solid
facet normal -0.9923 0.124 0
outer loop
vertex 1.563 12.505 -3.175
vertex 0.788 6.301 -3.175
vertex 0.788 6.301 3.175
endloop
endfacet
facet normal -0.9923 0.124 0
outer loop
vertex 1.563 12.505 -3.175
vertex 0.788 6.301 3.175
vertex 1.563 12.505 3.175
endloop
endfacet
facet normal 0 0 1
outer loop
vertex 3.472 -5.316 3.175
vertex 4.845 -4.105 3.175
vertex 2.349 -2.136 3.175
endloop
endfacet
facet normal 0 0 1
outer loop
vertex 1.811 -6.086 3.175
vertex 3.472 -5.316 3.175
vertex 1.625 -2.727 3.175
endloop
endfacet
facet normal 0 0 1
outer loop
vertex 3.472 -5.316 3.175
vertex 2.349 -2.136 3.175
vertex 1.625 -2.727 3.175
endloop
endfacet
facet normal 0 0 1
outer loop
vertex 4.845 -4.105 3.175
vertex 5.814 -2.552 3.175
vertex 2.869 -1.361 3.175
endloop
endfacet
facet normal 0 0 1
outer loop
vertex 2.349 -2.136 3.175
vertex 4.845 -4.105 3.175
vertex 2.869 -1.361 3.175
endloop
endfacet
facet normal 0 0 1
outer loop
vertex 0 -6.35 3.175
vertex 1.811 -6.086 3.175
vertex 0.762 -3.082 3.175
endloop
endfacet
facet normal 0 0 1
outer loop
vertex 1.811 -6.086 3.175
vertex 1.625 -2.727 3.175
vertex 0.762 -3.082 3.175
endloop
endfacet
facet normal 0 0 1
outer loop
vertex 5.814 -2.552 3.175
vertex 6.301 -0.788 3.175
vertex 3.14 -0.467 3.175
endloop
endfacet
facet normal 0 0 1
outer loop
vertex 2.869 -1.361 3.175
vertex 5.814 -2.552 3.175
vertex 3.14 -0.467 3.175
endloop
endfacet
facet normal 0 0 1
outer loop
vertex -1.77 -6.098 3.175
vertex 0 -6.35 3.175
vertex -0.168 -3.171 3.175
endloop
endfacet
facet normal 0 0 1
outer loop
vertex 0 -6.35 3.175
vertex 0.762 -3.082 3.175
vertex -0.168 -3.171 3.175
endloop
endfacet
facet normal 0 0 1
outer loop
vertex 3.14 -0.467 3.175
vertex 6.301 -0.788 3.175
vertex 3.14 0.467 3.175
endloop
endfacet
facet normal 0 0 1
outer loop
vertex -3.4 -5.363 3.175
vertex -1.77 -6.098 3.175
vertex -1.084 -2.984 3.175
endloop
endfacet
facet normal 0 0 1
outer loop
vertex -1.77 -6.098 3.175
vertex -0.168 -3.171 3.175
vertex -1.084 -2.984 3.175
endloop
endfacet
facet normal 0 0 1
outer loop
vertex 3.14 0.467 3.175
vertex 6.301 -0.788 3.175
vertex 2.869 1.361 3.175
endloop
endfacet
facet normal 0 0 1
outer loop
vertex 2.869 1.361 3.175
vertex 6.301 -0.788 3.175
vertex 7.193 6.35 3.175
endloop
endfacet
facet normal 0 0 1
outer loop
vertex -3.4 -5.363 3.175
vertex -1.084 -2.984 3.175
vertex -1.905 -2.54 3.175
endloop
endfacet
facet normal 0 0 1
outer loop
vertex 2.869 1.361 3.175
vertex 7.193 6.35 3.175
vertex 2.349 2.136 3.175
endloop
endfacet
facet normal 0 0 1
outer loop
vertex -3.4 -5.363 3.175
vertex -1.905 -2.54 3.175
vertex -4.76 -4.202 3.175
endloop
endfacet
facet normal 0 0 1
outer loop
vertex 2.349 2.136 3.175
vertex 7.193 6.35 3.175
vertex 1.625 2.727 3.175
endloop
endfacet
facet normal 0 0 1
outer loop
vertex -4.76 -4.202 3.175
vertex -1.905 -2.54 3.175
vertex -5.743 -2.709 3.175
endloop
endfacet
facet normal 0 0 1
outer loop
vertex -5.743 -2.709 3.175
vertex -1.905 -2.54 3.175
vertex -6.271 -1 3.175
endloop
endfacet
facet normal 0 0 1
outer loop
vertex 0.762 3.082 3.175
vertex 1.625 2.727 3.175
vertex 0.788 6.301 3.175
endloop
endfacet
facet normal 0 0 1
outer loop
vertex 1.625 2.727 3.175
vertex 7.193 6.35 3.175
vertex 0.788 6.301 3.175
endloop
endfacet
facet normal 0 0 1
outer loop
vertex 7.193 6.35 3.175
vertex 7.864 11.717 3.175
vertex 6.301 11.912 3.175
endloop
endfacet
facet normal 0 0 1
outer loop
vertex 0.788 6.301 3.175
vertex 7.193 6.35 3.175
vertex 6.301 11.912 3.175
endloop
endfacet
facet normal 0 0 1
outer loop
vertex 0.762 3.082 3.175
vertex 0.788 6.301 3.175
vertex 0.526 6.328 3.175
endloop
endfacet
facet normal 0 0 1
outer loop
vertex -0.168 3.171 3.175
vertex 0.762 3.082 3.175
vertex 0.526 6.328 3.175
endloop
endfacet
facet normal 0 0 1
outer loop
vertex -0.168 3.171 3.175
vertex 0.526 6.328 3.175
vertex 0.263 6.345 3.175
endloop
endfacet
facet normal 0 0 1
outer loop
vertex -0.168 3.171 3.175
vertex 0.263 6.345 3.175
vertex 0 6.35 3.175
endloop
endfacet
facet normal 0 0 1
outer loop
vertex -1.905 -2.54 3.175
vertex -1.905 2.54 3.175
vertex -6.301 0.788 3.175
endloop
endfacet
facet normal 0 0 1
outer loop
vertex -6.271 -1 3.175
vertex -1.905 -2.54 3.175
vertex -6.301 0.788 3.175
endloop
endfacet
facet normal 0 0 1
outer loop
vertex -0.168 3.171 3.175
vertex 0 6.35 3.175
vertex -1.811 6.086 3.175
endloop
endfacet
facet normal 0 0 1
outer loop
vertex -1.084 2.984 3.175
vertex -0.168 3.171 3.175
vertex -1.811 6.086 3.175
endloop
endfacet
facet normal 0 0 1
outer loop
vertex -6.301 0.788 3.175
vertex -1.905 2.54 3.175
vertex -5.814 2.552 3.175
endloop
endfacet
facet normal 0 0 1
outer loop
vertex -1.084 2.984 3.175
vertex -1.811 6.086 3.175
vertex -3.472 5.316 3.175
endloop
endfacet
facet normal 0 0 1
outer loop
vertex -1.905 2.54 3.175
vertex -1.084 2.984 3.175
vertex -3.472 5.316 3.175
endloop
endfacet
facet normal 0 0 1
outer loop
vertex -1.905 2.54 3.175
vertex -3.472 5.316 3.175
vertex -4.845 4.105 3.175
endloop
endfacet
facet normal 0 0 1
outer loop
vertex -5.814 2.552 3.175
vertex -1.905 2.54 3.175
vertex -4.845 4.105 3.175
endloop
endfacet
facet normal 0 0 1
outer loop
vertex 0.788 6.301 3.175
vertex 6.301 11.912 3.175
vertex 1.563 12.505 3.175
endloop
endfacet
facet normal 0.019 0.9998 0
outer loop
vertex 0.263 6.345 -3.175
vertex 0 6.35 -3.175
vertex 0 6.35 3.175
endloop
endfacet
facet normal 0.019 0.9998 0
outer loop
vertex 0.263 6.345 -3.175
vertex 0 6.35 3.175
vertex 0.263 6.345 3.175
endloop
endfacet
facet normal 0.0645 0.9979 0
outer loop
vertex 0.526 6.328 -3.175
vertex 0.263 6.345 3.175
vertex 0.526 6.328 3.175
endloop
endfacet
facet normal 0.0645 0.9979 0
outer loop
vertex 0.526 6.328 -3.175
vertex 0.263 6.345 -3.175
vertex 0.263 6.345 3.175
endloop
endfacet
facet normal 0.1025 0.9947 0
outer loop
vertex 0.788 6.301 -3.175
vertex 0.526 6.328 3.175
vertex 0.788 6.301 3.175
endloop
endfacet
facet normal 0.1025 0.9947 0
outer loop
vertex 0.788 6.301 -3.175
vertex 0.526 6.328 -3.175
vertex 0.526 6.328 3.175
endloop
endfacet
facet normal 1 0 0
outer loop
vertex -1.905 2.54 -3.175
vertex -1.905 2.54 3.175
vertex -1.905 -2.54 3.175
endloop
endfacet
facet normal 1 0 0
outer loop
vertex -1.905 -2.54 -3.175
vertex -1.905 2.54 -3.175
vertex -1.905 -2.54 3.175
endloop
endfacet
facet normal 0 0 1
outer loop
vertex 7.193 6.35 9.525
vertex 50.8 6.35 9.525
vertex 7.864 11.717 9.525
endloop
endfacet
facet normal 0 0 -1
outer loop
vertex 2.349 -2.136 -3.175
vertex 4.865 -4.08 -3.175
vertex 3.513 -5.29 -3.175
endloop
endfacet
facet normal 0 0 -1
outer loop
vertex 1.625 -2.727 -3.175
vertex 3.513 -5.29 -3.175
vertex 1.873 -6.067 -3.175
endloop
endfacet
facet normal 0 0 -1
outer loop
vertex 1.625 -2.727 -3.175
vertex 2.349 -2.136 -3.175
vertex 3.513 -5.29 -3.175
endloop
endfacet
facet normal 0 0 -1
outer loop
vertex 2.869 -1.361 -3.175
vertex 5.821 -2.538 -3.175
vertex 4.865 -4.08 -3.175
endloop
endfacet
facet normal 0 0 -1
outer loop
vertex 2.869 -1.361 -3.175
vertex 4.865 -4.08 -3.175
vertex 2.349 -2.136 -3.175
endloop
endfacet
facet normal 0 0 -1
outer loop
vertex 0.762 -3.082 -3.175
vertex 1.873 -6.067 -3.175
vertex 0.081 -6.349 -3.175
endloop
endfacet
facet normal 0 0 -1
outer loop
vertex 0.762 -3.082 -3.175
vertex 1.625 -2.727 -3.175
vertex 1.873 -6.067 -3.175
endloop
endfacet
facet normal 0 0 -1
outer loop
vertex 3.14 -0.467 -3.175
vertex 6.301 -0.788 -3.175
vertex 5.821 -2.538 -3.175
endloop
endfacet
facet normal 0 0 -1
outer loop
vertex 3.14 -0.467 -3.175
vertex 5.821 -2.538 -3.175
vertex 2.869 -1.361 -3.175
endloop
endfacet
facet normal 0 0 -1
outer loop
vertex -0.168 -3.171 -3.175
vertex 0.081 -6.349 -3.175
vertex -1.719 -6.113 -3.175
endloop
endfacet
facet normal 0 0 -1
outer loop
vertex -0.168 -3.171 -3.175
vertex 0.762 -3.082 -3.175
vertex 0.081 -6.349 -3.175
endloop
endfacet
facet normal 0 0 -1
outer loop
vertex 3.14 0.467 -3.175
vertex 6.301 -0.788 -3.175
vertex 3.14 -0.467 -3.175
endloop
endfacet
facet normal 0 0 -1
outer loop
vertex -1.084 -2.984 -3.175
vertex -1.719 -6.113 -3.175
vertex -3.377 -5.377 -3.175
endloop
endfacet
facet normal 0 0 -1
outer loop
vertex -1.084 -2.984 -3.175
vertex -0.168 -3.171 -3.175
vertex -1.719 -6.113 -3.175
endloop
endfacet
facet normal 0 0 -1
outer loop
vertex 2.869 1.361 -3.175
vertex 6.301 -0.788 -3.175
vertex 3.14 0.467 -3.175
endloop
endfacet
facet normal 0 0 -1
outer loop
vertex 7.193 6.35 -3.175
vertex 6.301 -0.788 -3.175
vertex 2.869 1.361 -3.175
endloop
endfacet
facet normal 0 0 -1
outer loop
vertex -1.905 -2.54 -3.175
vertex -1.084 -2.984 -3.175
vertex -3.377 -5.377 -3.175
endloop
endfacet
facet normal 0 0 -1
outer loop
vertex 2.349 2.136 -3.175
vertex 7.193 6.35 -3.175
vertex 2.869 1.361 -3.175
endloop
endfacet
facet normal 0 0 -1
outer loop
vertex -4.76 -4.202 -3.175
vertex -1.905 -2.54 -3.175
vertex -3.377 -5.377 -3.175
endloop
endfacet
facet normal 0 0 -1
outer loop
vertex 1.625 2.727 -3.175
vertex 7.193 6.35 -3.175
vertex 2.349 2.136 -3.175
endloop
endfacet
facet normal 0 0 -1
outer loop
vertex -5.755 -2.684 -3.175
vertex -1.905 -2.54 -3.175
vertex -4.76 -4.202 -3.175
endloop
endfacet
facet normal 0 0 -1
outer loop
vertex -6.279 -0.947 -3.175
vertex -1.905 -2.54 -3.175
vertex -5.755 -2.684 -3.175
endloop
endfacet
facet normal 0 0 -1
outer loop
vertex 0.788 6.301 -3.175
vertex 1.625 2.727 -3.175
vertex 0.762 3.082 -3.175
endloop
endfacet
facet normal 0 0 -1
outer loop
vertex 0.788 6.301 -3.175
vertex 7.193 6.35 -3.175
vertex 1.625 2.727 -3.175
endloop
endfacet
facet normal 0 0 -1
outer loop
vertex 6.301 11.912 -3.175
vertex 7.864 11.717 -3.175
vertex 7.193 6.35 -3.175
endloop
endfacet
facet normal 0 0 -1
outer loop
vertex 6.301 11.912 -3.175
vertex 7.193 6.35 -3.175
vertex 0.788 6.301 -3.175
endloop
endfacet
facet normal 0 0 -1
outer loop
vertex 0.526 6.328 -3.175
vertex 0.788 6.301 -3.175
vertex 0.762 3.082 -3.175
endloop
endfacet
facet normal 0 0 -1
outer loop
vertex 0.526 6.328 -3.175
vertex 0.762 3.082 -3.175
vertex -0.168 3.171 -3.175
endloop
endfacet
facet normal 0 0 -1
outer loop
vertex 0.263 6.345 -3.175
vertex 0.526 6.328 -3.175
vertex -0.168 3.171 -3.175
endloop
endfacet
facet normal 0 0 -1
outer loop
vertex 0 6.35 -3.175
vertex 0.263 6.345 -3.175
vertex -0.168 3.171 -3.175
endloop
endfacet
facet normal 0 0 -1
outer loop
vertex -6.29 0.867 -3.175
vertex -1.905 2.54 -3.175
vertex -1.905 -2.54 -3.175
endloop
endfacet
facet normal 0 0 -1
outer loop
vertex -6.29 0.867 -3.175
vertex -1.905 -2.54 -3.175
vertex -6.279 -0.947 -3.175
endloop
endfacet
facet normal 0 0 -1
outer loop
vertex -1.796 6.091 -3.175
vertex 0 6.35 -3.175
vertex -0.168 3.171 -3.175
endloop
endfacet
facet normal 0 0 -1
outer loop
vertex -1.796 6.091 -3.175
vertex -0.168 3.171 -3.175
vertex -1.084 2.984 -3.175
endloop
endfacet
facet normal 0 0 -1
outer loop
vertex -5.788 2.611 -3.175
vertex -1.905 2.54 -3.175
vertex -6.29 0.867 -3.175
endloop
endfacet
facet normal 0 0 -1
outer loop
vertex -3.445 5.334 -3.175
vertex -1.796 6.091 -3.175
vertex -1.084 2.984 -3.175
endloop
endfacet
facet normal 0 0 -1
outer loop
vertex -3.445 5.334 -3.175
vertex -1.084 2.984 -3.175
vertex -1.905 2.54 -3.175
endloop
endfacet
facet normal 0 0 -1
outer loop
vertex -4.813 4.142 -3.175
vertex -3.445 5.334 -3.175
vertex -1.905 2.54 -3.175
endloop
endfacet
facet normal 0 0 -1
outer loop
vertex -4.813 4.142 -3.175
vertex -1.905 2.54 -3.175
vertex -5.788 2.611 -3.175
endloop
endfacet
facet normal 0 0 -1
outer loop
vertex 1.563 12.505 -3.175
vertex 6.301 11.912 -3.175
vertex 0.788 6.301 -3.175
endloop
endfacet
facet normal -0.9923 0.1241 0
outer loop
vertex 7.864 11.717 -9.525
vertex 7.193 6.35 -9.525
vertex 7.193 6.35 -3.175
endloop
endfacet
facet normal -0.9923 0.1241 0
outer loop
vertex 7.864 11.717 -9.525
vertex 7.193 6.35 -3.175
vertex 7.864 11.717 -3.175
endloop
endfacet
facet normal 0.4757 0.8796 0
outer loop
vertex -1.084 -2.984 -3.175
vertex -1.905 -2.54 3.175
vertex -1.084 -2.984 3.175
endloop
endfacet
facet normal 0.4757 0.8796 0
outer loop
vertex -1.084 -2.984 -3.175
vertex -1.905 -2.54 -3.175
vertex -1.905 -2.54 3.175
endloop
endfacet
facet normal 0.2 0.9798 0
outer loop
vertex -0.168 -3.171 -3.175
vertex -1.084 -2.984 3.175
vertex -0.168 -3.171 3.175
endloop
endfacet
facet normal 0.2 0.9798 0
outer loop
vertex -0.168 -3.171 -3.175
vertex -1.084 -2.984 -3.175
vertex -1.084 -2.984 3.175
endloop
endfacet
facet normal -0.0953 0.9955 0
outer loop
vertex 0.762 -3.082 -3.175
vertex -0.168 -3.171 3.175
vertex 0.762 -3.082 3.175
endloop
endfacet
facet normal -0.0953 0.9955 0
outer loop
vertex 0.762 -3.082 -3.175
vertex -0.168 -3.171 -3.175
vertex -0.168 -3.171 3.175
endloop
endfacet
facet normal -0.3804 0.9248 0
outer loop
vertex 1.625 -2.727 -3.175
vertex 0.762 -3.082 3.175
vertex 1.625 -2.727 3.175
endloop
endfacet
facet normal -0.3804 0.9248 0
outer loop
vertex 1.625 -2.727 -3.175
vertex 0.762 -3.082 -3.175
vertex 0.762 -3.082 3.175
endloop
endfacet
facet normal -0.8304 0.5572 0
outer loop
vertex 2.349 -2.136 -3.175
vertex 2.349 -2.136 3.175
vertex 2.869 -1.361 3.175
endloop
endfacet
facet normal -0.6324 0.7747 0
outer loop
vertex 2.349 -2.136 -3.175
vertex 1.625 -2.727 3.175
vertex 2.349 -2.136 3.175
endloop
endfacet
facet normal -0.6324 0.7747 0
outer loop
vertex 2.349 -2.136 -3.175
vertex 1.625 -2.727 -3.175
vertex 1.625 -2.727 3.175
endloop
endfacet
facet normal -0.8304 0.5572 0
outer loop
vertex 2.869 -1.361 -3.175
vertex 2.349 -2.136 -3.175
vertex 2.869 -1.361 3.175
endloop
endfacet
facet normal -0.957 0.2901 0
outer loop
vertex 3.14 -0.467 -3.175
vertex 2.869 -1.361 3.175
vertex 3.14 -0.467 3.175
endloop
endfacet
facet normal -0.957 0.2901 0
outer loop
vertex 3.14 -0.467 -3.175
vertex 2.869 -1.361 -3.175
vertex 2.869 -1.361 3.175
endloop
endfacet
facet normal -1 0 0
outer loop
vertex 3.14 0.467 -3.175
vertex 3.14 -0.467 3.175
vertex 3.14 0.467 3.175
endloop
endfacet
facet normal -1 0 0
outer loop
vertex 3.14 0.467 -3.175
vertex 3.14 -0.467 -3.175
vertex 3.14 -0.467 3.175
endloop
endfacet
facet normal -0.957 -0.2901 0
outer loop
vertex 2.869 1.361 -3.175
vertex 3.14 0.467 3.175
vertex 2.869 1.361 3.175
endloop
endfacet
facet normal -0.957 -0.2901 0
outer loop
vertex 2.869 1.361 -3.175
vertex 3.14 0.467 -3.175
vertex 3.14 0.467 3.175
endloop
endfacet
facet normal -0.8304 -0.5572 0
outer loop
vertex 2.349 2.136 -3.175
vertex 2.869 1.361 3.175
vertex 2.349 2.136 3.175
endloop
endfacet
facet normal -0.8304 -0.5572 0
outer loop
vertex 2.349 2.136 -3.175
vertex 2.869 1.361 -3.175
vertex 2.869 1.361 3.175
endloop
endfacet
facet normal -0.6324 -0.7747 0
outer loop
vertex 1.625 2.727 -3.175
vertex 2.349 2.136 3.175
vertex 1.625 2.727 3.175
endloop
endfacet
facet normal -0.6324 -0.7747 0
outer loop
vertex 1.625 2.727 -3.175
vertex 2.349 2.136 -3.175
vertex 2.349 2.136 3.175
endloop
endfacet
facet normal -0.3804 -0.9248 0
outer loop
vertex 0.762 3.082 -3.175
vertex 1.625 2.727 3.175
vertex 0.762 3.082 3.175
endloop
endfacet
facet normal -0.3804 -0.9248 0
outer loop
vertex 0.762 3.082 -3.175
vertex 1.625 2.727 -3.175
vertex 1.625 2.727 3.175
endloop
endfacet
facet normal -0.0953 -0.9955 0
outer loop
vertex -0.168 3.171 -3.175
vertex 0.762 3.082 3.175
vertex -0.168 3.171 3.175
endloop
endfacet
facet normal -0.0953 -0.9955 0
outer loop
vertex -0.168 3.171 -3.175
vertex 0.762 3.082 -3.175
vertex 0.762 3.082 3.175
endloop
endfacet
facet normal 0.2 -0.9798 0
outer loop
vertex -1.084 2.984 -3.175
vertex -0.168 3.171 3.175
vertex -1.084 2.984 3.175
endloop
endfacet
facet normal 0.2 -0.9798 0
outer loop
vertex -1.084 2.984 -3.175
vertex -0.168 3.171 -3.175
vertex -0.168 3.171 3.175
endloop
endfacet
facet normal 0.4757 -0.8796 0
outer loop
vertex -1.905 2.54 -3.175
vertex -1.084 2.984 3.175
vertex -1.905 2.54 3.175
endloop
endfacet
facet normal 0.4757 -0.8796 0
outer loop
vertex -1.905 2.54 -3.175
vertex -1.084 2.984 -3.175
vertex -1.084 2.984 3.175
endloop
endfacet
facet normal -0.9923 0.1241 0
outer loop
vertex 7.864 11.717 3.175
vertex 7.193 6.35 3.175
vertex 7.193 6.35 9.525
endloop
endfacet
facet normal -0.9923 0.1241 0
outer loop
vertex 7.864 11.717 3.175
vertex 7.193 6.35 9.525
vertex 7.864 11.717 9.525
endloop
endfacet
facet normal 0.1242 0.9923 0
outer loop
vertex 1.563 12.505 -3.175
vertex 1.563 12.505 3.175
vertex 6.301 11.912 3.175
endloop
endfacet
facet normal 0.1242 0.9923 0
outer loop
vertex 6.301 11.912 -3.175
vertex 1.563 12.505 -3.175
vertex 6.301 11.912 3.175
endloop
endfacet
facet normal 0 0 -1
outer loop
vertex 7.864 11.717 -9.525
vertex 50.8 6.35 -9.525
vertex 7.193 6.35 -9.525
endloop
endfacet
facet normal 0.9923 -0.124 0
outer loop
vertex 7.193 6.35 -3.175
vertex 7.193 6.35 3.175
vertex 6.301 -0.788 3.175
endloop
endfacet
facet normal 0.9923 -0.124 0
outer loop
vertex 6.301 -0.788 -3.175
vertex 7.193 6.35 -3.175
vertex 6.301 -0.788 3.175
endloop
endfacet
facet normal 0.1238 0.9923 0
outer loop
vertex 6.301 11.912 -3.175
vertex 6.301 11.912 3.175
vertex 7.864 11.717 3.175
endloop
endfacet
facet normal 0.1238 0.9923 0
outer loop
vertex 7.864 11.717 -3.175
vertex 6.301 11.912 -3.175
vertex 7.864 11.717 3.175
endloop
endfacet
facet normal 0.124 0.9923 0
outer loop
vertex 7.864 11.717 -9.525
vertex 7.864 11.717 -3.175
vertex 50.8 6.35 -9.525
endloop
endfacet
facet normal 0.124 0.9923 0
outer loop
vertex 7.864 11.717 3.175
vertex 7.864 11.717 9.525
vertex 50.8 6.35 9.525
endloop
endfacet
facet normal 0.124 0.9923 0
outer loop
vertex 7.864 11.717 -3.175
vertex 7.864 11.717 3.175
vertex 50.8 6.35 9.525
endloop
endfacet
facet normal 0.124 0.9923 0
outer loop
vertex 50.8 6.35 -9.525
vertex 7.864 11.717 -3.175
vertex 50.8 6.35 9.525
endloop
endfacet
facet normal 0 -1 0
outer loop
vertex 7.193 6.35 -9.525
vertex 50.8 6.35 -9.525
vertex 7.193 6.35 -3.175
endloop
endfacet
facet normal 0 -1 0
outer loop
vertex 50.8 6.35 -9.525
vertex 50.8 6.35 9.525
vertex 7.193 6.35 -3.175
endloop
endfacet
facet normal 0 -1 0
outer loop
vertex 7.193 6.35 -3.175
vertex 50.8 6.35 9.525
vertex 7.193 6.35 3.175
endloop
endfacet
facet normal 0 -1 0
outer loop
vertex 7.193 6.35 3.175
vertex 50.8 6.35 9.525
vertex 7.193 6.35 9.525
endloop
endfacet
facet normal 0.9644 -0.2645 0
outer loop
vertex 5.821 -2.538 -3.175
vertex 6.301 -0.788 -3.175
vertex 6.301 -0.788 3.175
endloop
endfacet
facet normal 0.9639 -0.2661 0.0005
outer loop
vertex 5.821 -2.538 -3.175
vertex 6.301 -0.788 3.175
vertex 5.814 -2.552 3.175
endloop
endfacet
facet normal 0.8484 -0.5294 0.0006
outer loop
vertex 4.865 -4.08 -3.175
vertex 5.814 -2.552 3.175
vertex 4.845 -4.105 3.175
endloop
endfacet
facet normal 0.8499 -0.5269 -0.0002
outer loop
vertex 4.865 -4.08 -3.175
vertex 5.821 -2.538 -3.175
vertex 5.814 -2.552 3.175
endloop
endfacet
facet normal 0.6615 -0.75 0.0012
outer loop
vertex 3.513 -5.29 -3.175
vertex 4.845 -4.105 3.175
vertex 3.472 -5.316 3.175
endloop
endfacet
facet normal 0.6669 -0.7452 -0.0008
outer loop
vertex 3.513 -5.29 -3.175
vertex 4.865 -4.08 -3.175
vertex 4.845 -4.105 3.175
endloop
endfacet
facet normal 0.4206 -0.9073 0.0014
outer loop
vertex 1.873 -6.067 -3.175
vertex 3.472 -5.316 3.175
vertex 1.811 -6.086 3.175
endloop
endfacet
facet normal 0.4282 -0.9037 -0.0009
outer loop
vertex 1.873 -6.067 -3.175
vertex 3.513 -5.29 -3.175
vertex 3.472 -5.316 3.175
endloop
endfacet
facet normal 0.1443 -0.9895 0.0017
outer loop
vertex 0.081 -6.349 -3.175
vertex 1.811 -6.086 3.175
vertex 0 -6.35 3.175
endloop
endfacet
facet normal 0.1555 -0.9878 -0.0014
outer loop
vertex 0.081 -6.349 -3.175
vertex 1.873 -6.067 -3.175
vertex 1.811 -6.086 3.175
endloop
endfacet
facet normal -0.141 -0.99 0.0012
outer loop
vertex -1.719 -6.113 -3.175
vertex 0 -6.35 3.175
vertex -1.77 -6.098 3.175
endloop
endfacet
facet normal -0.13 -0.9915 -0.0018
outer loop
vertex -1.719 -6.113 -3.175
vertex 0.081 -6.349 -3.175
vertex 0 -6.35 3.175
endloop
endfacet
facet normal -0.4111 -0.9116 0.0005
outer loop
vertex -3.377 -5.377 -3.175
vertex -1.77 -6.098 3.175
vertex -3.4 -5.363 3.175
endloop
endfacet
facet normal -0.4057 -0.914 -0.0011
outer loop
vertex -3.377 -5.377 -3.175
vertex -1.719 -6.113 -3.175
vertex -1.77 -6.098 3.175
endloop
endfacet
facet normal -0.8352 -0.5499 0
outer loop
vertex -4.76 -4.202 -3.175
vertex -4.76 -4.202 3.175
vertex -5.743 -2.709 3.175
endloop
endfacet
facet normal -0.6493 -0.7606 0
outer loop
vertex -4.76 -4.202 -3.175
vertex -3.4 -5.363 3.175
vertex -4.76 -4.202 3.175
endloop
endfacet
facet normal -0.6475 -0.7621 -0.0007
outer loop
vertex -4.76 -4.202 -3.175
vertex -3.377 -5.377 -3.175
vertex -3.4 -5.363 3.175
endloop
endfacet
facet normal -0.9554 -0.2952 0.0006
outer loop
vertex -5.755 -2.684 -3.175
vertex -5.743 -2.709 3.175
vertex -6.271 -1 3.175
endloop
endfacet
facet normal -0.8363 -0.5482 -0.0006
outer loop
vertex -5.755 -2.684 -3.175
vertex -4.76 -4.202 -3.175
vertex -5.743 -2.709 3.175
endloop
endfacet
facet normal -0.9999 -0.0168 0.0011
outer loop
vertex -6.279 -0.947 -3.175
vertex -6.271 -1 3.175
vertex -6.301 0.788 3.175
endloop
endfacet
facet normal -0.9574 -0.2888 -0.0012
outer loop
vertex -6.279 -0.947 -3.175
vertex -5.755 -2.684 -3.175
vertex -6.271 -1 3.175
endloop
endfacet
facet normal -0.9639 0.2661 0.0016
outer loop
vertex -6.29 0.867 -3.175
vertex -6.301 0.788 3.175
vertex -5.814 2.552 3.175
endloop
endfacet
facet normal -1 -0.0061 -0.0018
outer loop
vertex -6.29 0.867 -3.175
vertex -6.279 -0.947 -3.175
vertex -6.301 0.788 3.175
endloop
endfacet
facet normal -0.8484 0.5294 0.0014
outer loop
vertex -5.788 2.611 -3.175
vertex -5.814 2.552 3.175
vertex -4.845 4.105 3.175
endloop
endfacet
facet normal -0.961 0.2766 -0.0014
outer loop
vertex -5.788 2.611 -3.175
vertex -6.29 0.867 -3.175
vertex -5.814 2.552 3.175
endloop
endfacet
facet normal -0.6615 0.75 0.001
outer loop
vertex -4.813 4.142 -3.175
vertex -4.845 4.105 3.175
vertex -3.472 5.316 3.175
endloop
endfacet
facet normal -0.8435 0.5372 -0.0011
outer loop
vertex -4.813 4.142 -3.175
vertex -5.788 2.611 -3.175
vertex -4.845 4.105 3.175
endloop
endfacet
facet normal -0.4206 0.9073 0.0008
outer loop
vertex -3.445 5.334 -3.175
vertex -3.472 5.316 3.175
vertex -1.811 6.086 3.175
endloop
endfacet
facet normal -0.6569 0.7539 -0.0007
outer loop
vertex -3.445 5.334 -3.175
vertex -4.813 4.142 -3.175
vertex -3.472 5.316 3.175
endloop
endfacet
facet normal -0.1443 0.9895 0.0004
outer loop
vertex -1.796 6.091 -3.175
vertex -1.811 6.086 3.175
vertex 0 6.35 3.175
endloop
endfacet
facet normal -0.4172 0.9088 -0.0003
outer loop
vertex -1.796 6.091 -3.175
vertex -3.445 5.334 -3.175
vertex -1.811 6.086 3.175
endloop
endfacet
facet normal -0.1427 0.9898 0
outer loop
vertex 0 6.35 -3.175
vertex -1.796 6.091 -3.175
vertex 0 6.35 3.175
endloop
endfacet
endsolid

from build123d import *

# Parameters (mm, degrees)
SKETCH1_R               = 3.175
BOSS_EXTRUDE1_DEPTH     = 9.525
CUT_EXTRUDE1_DEPTH      = 6.35
CUT_EXTRUDE2_START      = -19.05
CUT_EXTRUDE2_DEPTH      = 6.35
BOSS_EXTRUDE2_DEPTH     = 6.35
CUT_EXTRUDE5_DEPTH      = 54.858594107
CUT_EXTRUDE5_DEPTH_BACK = 54.858594107


with BuildPart() as part:
    # Sketch1 → Boss-Extrude1 (new, symmetric)
    with BuildSketch(Plane.XY):
        with BuildLine():
            Line((6.300964517, 11.912379435), (50.8, 6.35))
            Line((50.8, 6.35), (7.193167088, 6.35))
            Line((7.193167088, 6.35), (6.300964517, -0.787620565))
            ThreePointArc((6.300964517, -0.787620565), (4.202446277, -4.760456416), (0, -6.35))
            ThreePointArc((0, -6.35), (-4.760456416, -4.202446277), (-6.300964517, 0.787620565))
            ThreePointArc((-6.300964517, 0.787620565), (-4.202446277, 4.760456416), (0, 6.35))
            Line((0, 6.35), (0.781538462, 12.602307692))
            Line((0.781538462, 12.602307692), (6.300964517, 11.912379435))
        make_face()
        with Locations(Location((0, 0, 0), (0, 0, 180))):
            Circle(SKETCH1_R, mode=Mode.SUBTRACT)
    extrude(amount=BOSS_EXTRUDE1_DEPTH, both=True)

    # Sketch2 → Cut-Extrude1 (cut)
    with BuildSketch(Plane.XY.offset(9.525)):
        Polygon((7.193167088, 21.115513253), (-6.35, 21.115513253), (-6.35, 0.257727368), (-6.35, -6.35), (7.193167088, -6.35), (7.193167088, 6.35), (8.941363703, 20.335572925), align=None)
    extrude(amount=-CUT_EXTRUDE1_DEPTH, mode=Mode.SUBTRACT)

    # Sketch2<2> → Cut-Extrude2 (cut)
    with BuildSketch(Plane.XY.offset(9.525).offset(CUT_EXTRUDE2_START)):
        Polygon((7.193167088, 21.115513253), (-6.35, 21.115513253), (-6.35, 0.257727368), (-6.35, -6.35), (7.193167088, -6.35), (7.193167088, 6.35), (8.941363703, 20.335572925), align=None)
    extrude(amount=CUT_EXTRUDE2_DEPTH, mode=Mode.SUBTRACT)

    # Sketch3 → Boss-Extrude2 (add)
    with BuildSketch(Plane.XY.offset(3.175)):
        with BuildLine():
            Line((-1.905, 2.54), (-1.905, -2.54))
            ThreePointArc((-1.905, -2.54), (-3.175, 0), (-1.905, 2.54))
        make_face()
    extrude(amount=-BOSS_EXTRUDE2_DEPTH)

    # Sketch4 → Cut-Extrude5 (cut, two sides: drawn at the far end of the back side and taken through both)
    with BuildSketch(Plane.XY.offset(3.175).offset(-CUT_EXTRUDE5_DEPTH_BACK)):
        with BuildLine():
            Line((0.787620565, 6.300964517), (1.563076923, 12.504615385))
            Line((1.563076923, 12.504615385), (-1.51572631, 12.889465789))
            Line((-1.51572631, 12.889465789), (-2.391608705, 5.882406634))
            ThreePointArc((-2.391608705, 5.882406634), (-0.828849904, 6.29567374), (0.787620565, 6.300964517))
        make_face()
    extrude(amount=CUT_EXTRUDE5_DEPTH + CUT_EXTRUDE5_DEPTH_BACK, mode=Mode.SUBTRACT)


solid = part.part
